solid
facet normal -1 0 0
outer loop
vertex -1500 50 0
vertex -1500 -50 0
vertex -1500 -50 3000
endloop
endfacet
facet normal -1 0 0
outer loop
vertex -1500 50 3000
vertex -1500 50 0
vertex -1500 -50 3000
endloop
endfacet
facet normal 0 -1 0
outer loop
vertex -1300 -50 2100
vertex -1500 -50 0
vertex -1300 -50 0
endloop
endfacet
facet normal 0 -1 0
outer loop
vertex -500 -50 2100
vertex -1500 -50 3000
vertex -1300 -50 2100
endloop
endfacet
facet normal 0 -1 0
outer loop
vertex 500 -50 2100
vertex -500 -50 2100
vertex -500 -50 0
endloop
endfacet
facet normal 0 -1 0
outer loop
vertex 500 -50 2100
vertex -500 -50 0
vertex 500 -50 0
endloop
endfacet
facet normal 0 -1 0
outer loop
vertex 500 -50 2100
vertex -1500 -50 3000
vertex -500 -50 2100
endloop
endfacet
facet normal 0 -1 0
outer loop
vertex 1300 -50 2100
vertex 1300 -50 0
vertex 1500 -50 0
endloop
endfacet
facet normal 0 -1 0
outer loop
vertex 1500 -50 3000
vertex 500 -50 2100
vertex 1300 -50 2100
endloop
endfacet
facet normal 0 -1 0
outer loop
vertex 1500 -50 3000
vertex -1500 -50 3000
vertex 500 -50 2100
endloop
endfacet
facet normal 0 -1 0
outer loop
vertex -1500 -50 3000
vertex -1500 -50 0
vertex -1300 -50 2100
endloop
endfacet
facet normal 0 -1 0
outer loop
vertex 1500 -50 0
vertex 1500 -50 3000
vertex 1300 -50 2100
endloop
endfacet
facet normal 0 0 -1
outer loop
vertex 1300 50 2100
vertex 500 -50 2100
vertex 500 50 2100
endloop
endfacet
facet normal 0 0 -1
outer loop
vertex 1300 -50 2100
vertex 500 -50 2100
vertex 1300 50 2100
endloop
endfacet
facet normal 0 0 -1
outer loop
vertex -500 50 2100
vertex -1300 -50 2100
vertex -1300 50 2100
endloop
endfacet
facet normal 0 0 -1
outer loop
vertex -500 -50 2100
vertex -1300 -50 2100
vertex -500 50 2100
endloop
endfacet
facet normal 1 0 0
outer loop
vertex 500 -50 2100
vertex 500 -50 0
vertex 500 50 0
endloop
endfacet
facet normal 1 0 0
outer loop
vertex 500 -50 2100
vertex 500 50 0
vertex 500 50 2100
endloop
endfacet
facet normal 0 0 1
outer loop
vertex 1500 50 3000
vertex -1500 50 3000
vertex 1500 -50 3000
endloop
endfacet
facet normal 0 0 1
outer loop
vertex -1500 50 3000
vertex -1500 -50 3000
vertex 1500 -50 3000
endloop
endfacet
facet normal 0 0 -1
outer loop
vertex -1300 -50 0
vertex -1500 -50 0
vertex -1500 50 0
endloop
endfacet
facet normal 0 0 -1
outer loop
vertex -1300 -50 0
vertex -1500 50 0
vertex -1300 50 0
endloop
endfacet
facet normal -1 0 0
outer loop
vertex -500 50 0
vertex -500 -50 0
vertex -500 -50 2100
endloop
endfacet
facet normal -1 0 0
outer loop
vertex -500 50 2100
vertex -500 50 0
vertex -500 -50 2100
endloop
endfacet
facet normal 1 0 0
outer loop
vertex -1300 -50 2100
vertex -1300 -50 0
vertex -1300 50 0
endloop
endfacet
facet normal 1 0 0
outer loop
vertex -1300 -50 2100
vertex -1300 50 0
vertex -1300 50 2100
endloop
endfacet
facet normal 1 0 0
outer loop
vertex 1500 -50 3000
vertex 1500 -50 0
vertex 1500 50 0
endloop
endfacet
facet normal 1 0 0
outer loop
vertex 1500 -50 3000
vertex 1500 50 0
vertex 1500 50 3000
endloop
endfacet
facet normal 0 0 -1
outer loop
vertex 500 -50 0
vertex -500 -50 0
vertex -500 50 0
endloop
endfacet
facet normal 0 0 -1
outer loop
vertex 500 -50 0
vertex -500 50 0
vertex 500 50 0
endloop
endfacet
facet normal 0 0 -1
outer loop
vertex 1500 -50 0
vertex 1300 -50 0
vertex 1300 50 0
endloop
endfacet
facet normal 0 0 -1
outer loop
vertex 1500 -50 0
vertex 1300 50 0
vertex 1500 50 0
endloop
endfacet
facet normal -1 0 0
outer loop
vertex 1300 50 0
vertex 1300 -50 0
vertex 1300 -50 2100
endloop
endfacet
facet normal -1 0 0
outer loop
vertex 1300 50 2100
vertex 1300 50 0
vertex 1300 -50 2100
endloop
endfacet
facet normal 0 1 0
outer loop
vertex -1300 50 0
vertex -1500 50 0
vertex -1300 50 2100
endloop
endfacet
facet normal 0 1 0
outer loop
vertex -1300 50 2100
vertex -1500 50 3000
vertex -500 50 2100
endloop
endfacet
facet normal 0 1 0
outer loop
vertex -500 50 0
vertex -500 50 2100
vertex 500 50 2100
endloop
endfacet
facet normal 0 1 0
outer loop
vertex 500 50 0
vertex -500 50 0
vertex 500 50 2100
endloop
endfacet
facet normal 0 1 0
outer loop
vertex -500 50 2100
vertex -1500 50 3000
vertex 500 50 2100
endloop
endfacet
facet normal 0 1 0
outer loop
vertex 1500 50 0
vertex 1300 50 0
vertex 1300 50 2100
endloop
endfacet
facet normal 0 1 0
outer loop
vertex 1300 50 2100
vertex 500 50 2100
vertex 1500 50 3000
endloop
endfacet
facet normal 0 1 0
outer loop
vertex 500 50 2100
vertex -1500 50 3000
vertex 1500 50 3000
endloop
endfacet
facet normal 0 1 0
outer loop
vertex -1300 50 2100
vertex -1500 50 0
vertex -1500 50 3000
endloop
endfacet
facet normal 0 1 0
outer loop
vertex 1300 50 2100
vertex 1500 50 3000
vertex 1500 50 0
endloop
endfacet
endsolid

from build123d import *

# Parameters (mm, degrees)
F0_W     = 3000
F0_H     = 3000
F1_DEPTH = 50
F2_W     = 800
F2_H     = 2100
F3_DEPTH = 100.001


with BuildPart() as f1:
    # F0 (on Front) → F1 (new body, symmetric)
    with BuildSketch(Plane.XZ):
        with Locations((0, 1500)):
            Rectangle(F0_W, F0_H)
    extrude(amount=F1_DEPTH, both=True)

    # F2 (on face) → F3 (cut, through all)
    with BuildSketch(Plane.XZ.offset(50)):
        with Locations((900, 1050)):
            Rectangle(F2_W, F2_H)
        with Locations((-900, 1050)):
            Rectangle(F2_W, F2_H)
    extrude(amount=-F3_DEPTH, mode=Mode.SUBTRACT)


solid = f1.part
